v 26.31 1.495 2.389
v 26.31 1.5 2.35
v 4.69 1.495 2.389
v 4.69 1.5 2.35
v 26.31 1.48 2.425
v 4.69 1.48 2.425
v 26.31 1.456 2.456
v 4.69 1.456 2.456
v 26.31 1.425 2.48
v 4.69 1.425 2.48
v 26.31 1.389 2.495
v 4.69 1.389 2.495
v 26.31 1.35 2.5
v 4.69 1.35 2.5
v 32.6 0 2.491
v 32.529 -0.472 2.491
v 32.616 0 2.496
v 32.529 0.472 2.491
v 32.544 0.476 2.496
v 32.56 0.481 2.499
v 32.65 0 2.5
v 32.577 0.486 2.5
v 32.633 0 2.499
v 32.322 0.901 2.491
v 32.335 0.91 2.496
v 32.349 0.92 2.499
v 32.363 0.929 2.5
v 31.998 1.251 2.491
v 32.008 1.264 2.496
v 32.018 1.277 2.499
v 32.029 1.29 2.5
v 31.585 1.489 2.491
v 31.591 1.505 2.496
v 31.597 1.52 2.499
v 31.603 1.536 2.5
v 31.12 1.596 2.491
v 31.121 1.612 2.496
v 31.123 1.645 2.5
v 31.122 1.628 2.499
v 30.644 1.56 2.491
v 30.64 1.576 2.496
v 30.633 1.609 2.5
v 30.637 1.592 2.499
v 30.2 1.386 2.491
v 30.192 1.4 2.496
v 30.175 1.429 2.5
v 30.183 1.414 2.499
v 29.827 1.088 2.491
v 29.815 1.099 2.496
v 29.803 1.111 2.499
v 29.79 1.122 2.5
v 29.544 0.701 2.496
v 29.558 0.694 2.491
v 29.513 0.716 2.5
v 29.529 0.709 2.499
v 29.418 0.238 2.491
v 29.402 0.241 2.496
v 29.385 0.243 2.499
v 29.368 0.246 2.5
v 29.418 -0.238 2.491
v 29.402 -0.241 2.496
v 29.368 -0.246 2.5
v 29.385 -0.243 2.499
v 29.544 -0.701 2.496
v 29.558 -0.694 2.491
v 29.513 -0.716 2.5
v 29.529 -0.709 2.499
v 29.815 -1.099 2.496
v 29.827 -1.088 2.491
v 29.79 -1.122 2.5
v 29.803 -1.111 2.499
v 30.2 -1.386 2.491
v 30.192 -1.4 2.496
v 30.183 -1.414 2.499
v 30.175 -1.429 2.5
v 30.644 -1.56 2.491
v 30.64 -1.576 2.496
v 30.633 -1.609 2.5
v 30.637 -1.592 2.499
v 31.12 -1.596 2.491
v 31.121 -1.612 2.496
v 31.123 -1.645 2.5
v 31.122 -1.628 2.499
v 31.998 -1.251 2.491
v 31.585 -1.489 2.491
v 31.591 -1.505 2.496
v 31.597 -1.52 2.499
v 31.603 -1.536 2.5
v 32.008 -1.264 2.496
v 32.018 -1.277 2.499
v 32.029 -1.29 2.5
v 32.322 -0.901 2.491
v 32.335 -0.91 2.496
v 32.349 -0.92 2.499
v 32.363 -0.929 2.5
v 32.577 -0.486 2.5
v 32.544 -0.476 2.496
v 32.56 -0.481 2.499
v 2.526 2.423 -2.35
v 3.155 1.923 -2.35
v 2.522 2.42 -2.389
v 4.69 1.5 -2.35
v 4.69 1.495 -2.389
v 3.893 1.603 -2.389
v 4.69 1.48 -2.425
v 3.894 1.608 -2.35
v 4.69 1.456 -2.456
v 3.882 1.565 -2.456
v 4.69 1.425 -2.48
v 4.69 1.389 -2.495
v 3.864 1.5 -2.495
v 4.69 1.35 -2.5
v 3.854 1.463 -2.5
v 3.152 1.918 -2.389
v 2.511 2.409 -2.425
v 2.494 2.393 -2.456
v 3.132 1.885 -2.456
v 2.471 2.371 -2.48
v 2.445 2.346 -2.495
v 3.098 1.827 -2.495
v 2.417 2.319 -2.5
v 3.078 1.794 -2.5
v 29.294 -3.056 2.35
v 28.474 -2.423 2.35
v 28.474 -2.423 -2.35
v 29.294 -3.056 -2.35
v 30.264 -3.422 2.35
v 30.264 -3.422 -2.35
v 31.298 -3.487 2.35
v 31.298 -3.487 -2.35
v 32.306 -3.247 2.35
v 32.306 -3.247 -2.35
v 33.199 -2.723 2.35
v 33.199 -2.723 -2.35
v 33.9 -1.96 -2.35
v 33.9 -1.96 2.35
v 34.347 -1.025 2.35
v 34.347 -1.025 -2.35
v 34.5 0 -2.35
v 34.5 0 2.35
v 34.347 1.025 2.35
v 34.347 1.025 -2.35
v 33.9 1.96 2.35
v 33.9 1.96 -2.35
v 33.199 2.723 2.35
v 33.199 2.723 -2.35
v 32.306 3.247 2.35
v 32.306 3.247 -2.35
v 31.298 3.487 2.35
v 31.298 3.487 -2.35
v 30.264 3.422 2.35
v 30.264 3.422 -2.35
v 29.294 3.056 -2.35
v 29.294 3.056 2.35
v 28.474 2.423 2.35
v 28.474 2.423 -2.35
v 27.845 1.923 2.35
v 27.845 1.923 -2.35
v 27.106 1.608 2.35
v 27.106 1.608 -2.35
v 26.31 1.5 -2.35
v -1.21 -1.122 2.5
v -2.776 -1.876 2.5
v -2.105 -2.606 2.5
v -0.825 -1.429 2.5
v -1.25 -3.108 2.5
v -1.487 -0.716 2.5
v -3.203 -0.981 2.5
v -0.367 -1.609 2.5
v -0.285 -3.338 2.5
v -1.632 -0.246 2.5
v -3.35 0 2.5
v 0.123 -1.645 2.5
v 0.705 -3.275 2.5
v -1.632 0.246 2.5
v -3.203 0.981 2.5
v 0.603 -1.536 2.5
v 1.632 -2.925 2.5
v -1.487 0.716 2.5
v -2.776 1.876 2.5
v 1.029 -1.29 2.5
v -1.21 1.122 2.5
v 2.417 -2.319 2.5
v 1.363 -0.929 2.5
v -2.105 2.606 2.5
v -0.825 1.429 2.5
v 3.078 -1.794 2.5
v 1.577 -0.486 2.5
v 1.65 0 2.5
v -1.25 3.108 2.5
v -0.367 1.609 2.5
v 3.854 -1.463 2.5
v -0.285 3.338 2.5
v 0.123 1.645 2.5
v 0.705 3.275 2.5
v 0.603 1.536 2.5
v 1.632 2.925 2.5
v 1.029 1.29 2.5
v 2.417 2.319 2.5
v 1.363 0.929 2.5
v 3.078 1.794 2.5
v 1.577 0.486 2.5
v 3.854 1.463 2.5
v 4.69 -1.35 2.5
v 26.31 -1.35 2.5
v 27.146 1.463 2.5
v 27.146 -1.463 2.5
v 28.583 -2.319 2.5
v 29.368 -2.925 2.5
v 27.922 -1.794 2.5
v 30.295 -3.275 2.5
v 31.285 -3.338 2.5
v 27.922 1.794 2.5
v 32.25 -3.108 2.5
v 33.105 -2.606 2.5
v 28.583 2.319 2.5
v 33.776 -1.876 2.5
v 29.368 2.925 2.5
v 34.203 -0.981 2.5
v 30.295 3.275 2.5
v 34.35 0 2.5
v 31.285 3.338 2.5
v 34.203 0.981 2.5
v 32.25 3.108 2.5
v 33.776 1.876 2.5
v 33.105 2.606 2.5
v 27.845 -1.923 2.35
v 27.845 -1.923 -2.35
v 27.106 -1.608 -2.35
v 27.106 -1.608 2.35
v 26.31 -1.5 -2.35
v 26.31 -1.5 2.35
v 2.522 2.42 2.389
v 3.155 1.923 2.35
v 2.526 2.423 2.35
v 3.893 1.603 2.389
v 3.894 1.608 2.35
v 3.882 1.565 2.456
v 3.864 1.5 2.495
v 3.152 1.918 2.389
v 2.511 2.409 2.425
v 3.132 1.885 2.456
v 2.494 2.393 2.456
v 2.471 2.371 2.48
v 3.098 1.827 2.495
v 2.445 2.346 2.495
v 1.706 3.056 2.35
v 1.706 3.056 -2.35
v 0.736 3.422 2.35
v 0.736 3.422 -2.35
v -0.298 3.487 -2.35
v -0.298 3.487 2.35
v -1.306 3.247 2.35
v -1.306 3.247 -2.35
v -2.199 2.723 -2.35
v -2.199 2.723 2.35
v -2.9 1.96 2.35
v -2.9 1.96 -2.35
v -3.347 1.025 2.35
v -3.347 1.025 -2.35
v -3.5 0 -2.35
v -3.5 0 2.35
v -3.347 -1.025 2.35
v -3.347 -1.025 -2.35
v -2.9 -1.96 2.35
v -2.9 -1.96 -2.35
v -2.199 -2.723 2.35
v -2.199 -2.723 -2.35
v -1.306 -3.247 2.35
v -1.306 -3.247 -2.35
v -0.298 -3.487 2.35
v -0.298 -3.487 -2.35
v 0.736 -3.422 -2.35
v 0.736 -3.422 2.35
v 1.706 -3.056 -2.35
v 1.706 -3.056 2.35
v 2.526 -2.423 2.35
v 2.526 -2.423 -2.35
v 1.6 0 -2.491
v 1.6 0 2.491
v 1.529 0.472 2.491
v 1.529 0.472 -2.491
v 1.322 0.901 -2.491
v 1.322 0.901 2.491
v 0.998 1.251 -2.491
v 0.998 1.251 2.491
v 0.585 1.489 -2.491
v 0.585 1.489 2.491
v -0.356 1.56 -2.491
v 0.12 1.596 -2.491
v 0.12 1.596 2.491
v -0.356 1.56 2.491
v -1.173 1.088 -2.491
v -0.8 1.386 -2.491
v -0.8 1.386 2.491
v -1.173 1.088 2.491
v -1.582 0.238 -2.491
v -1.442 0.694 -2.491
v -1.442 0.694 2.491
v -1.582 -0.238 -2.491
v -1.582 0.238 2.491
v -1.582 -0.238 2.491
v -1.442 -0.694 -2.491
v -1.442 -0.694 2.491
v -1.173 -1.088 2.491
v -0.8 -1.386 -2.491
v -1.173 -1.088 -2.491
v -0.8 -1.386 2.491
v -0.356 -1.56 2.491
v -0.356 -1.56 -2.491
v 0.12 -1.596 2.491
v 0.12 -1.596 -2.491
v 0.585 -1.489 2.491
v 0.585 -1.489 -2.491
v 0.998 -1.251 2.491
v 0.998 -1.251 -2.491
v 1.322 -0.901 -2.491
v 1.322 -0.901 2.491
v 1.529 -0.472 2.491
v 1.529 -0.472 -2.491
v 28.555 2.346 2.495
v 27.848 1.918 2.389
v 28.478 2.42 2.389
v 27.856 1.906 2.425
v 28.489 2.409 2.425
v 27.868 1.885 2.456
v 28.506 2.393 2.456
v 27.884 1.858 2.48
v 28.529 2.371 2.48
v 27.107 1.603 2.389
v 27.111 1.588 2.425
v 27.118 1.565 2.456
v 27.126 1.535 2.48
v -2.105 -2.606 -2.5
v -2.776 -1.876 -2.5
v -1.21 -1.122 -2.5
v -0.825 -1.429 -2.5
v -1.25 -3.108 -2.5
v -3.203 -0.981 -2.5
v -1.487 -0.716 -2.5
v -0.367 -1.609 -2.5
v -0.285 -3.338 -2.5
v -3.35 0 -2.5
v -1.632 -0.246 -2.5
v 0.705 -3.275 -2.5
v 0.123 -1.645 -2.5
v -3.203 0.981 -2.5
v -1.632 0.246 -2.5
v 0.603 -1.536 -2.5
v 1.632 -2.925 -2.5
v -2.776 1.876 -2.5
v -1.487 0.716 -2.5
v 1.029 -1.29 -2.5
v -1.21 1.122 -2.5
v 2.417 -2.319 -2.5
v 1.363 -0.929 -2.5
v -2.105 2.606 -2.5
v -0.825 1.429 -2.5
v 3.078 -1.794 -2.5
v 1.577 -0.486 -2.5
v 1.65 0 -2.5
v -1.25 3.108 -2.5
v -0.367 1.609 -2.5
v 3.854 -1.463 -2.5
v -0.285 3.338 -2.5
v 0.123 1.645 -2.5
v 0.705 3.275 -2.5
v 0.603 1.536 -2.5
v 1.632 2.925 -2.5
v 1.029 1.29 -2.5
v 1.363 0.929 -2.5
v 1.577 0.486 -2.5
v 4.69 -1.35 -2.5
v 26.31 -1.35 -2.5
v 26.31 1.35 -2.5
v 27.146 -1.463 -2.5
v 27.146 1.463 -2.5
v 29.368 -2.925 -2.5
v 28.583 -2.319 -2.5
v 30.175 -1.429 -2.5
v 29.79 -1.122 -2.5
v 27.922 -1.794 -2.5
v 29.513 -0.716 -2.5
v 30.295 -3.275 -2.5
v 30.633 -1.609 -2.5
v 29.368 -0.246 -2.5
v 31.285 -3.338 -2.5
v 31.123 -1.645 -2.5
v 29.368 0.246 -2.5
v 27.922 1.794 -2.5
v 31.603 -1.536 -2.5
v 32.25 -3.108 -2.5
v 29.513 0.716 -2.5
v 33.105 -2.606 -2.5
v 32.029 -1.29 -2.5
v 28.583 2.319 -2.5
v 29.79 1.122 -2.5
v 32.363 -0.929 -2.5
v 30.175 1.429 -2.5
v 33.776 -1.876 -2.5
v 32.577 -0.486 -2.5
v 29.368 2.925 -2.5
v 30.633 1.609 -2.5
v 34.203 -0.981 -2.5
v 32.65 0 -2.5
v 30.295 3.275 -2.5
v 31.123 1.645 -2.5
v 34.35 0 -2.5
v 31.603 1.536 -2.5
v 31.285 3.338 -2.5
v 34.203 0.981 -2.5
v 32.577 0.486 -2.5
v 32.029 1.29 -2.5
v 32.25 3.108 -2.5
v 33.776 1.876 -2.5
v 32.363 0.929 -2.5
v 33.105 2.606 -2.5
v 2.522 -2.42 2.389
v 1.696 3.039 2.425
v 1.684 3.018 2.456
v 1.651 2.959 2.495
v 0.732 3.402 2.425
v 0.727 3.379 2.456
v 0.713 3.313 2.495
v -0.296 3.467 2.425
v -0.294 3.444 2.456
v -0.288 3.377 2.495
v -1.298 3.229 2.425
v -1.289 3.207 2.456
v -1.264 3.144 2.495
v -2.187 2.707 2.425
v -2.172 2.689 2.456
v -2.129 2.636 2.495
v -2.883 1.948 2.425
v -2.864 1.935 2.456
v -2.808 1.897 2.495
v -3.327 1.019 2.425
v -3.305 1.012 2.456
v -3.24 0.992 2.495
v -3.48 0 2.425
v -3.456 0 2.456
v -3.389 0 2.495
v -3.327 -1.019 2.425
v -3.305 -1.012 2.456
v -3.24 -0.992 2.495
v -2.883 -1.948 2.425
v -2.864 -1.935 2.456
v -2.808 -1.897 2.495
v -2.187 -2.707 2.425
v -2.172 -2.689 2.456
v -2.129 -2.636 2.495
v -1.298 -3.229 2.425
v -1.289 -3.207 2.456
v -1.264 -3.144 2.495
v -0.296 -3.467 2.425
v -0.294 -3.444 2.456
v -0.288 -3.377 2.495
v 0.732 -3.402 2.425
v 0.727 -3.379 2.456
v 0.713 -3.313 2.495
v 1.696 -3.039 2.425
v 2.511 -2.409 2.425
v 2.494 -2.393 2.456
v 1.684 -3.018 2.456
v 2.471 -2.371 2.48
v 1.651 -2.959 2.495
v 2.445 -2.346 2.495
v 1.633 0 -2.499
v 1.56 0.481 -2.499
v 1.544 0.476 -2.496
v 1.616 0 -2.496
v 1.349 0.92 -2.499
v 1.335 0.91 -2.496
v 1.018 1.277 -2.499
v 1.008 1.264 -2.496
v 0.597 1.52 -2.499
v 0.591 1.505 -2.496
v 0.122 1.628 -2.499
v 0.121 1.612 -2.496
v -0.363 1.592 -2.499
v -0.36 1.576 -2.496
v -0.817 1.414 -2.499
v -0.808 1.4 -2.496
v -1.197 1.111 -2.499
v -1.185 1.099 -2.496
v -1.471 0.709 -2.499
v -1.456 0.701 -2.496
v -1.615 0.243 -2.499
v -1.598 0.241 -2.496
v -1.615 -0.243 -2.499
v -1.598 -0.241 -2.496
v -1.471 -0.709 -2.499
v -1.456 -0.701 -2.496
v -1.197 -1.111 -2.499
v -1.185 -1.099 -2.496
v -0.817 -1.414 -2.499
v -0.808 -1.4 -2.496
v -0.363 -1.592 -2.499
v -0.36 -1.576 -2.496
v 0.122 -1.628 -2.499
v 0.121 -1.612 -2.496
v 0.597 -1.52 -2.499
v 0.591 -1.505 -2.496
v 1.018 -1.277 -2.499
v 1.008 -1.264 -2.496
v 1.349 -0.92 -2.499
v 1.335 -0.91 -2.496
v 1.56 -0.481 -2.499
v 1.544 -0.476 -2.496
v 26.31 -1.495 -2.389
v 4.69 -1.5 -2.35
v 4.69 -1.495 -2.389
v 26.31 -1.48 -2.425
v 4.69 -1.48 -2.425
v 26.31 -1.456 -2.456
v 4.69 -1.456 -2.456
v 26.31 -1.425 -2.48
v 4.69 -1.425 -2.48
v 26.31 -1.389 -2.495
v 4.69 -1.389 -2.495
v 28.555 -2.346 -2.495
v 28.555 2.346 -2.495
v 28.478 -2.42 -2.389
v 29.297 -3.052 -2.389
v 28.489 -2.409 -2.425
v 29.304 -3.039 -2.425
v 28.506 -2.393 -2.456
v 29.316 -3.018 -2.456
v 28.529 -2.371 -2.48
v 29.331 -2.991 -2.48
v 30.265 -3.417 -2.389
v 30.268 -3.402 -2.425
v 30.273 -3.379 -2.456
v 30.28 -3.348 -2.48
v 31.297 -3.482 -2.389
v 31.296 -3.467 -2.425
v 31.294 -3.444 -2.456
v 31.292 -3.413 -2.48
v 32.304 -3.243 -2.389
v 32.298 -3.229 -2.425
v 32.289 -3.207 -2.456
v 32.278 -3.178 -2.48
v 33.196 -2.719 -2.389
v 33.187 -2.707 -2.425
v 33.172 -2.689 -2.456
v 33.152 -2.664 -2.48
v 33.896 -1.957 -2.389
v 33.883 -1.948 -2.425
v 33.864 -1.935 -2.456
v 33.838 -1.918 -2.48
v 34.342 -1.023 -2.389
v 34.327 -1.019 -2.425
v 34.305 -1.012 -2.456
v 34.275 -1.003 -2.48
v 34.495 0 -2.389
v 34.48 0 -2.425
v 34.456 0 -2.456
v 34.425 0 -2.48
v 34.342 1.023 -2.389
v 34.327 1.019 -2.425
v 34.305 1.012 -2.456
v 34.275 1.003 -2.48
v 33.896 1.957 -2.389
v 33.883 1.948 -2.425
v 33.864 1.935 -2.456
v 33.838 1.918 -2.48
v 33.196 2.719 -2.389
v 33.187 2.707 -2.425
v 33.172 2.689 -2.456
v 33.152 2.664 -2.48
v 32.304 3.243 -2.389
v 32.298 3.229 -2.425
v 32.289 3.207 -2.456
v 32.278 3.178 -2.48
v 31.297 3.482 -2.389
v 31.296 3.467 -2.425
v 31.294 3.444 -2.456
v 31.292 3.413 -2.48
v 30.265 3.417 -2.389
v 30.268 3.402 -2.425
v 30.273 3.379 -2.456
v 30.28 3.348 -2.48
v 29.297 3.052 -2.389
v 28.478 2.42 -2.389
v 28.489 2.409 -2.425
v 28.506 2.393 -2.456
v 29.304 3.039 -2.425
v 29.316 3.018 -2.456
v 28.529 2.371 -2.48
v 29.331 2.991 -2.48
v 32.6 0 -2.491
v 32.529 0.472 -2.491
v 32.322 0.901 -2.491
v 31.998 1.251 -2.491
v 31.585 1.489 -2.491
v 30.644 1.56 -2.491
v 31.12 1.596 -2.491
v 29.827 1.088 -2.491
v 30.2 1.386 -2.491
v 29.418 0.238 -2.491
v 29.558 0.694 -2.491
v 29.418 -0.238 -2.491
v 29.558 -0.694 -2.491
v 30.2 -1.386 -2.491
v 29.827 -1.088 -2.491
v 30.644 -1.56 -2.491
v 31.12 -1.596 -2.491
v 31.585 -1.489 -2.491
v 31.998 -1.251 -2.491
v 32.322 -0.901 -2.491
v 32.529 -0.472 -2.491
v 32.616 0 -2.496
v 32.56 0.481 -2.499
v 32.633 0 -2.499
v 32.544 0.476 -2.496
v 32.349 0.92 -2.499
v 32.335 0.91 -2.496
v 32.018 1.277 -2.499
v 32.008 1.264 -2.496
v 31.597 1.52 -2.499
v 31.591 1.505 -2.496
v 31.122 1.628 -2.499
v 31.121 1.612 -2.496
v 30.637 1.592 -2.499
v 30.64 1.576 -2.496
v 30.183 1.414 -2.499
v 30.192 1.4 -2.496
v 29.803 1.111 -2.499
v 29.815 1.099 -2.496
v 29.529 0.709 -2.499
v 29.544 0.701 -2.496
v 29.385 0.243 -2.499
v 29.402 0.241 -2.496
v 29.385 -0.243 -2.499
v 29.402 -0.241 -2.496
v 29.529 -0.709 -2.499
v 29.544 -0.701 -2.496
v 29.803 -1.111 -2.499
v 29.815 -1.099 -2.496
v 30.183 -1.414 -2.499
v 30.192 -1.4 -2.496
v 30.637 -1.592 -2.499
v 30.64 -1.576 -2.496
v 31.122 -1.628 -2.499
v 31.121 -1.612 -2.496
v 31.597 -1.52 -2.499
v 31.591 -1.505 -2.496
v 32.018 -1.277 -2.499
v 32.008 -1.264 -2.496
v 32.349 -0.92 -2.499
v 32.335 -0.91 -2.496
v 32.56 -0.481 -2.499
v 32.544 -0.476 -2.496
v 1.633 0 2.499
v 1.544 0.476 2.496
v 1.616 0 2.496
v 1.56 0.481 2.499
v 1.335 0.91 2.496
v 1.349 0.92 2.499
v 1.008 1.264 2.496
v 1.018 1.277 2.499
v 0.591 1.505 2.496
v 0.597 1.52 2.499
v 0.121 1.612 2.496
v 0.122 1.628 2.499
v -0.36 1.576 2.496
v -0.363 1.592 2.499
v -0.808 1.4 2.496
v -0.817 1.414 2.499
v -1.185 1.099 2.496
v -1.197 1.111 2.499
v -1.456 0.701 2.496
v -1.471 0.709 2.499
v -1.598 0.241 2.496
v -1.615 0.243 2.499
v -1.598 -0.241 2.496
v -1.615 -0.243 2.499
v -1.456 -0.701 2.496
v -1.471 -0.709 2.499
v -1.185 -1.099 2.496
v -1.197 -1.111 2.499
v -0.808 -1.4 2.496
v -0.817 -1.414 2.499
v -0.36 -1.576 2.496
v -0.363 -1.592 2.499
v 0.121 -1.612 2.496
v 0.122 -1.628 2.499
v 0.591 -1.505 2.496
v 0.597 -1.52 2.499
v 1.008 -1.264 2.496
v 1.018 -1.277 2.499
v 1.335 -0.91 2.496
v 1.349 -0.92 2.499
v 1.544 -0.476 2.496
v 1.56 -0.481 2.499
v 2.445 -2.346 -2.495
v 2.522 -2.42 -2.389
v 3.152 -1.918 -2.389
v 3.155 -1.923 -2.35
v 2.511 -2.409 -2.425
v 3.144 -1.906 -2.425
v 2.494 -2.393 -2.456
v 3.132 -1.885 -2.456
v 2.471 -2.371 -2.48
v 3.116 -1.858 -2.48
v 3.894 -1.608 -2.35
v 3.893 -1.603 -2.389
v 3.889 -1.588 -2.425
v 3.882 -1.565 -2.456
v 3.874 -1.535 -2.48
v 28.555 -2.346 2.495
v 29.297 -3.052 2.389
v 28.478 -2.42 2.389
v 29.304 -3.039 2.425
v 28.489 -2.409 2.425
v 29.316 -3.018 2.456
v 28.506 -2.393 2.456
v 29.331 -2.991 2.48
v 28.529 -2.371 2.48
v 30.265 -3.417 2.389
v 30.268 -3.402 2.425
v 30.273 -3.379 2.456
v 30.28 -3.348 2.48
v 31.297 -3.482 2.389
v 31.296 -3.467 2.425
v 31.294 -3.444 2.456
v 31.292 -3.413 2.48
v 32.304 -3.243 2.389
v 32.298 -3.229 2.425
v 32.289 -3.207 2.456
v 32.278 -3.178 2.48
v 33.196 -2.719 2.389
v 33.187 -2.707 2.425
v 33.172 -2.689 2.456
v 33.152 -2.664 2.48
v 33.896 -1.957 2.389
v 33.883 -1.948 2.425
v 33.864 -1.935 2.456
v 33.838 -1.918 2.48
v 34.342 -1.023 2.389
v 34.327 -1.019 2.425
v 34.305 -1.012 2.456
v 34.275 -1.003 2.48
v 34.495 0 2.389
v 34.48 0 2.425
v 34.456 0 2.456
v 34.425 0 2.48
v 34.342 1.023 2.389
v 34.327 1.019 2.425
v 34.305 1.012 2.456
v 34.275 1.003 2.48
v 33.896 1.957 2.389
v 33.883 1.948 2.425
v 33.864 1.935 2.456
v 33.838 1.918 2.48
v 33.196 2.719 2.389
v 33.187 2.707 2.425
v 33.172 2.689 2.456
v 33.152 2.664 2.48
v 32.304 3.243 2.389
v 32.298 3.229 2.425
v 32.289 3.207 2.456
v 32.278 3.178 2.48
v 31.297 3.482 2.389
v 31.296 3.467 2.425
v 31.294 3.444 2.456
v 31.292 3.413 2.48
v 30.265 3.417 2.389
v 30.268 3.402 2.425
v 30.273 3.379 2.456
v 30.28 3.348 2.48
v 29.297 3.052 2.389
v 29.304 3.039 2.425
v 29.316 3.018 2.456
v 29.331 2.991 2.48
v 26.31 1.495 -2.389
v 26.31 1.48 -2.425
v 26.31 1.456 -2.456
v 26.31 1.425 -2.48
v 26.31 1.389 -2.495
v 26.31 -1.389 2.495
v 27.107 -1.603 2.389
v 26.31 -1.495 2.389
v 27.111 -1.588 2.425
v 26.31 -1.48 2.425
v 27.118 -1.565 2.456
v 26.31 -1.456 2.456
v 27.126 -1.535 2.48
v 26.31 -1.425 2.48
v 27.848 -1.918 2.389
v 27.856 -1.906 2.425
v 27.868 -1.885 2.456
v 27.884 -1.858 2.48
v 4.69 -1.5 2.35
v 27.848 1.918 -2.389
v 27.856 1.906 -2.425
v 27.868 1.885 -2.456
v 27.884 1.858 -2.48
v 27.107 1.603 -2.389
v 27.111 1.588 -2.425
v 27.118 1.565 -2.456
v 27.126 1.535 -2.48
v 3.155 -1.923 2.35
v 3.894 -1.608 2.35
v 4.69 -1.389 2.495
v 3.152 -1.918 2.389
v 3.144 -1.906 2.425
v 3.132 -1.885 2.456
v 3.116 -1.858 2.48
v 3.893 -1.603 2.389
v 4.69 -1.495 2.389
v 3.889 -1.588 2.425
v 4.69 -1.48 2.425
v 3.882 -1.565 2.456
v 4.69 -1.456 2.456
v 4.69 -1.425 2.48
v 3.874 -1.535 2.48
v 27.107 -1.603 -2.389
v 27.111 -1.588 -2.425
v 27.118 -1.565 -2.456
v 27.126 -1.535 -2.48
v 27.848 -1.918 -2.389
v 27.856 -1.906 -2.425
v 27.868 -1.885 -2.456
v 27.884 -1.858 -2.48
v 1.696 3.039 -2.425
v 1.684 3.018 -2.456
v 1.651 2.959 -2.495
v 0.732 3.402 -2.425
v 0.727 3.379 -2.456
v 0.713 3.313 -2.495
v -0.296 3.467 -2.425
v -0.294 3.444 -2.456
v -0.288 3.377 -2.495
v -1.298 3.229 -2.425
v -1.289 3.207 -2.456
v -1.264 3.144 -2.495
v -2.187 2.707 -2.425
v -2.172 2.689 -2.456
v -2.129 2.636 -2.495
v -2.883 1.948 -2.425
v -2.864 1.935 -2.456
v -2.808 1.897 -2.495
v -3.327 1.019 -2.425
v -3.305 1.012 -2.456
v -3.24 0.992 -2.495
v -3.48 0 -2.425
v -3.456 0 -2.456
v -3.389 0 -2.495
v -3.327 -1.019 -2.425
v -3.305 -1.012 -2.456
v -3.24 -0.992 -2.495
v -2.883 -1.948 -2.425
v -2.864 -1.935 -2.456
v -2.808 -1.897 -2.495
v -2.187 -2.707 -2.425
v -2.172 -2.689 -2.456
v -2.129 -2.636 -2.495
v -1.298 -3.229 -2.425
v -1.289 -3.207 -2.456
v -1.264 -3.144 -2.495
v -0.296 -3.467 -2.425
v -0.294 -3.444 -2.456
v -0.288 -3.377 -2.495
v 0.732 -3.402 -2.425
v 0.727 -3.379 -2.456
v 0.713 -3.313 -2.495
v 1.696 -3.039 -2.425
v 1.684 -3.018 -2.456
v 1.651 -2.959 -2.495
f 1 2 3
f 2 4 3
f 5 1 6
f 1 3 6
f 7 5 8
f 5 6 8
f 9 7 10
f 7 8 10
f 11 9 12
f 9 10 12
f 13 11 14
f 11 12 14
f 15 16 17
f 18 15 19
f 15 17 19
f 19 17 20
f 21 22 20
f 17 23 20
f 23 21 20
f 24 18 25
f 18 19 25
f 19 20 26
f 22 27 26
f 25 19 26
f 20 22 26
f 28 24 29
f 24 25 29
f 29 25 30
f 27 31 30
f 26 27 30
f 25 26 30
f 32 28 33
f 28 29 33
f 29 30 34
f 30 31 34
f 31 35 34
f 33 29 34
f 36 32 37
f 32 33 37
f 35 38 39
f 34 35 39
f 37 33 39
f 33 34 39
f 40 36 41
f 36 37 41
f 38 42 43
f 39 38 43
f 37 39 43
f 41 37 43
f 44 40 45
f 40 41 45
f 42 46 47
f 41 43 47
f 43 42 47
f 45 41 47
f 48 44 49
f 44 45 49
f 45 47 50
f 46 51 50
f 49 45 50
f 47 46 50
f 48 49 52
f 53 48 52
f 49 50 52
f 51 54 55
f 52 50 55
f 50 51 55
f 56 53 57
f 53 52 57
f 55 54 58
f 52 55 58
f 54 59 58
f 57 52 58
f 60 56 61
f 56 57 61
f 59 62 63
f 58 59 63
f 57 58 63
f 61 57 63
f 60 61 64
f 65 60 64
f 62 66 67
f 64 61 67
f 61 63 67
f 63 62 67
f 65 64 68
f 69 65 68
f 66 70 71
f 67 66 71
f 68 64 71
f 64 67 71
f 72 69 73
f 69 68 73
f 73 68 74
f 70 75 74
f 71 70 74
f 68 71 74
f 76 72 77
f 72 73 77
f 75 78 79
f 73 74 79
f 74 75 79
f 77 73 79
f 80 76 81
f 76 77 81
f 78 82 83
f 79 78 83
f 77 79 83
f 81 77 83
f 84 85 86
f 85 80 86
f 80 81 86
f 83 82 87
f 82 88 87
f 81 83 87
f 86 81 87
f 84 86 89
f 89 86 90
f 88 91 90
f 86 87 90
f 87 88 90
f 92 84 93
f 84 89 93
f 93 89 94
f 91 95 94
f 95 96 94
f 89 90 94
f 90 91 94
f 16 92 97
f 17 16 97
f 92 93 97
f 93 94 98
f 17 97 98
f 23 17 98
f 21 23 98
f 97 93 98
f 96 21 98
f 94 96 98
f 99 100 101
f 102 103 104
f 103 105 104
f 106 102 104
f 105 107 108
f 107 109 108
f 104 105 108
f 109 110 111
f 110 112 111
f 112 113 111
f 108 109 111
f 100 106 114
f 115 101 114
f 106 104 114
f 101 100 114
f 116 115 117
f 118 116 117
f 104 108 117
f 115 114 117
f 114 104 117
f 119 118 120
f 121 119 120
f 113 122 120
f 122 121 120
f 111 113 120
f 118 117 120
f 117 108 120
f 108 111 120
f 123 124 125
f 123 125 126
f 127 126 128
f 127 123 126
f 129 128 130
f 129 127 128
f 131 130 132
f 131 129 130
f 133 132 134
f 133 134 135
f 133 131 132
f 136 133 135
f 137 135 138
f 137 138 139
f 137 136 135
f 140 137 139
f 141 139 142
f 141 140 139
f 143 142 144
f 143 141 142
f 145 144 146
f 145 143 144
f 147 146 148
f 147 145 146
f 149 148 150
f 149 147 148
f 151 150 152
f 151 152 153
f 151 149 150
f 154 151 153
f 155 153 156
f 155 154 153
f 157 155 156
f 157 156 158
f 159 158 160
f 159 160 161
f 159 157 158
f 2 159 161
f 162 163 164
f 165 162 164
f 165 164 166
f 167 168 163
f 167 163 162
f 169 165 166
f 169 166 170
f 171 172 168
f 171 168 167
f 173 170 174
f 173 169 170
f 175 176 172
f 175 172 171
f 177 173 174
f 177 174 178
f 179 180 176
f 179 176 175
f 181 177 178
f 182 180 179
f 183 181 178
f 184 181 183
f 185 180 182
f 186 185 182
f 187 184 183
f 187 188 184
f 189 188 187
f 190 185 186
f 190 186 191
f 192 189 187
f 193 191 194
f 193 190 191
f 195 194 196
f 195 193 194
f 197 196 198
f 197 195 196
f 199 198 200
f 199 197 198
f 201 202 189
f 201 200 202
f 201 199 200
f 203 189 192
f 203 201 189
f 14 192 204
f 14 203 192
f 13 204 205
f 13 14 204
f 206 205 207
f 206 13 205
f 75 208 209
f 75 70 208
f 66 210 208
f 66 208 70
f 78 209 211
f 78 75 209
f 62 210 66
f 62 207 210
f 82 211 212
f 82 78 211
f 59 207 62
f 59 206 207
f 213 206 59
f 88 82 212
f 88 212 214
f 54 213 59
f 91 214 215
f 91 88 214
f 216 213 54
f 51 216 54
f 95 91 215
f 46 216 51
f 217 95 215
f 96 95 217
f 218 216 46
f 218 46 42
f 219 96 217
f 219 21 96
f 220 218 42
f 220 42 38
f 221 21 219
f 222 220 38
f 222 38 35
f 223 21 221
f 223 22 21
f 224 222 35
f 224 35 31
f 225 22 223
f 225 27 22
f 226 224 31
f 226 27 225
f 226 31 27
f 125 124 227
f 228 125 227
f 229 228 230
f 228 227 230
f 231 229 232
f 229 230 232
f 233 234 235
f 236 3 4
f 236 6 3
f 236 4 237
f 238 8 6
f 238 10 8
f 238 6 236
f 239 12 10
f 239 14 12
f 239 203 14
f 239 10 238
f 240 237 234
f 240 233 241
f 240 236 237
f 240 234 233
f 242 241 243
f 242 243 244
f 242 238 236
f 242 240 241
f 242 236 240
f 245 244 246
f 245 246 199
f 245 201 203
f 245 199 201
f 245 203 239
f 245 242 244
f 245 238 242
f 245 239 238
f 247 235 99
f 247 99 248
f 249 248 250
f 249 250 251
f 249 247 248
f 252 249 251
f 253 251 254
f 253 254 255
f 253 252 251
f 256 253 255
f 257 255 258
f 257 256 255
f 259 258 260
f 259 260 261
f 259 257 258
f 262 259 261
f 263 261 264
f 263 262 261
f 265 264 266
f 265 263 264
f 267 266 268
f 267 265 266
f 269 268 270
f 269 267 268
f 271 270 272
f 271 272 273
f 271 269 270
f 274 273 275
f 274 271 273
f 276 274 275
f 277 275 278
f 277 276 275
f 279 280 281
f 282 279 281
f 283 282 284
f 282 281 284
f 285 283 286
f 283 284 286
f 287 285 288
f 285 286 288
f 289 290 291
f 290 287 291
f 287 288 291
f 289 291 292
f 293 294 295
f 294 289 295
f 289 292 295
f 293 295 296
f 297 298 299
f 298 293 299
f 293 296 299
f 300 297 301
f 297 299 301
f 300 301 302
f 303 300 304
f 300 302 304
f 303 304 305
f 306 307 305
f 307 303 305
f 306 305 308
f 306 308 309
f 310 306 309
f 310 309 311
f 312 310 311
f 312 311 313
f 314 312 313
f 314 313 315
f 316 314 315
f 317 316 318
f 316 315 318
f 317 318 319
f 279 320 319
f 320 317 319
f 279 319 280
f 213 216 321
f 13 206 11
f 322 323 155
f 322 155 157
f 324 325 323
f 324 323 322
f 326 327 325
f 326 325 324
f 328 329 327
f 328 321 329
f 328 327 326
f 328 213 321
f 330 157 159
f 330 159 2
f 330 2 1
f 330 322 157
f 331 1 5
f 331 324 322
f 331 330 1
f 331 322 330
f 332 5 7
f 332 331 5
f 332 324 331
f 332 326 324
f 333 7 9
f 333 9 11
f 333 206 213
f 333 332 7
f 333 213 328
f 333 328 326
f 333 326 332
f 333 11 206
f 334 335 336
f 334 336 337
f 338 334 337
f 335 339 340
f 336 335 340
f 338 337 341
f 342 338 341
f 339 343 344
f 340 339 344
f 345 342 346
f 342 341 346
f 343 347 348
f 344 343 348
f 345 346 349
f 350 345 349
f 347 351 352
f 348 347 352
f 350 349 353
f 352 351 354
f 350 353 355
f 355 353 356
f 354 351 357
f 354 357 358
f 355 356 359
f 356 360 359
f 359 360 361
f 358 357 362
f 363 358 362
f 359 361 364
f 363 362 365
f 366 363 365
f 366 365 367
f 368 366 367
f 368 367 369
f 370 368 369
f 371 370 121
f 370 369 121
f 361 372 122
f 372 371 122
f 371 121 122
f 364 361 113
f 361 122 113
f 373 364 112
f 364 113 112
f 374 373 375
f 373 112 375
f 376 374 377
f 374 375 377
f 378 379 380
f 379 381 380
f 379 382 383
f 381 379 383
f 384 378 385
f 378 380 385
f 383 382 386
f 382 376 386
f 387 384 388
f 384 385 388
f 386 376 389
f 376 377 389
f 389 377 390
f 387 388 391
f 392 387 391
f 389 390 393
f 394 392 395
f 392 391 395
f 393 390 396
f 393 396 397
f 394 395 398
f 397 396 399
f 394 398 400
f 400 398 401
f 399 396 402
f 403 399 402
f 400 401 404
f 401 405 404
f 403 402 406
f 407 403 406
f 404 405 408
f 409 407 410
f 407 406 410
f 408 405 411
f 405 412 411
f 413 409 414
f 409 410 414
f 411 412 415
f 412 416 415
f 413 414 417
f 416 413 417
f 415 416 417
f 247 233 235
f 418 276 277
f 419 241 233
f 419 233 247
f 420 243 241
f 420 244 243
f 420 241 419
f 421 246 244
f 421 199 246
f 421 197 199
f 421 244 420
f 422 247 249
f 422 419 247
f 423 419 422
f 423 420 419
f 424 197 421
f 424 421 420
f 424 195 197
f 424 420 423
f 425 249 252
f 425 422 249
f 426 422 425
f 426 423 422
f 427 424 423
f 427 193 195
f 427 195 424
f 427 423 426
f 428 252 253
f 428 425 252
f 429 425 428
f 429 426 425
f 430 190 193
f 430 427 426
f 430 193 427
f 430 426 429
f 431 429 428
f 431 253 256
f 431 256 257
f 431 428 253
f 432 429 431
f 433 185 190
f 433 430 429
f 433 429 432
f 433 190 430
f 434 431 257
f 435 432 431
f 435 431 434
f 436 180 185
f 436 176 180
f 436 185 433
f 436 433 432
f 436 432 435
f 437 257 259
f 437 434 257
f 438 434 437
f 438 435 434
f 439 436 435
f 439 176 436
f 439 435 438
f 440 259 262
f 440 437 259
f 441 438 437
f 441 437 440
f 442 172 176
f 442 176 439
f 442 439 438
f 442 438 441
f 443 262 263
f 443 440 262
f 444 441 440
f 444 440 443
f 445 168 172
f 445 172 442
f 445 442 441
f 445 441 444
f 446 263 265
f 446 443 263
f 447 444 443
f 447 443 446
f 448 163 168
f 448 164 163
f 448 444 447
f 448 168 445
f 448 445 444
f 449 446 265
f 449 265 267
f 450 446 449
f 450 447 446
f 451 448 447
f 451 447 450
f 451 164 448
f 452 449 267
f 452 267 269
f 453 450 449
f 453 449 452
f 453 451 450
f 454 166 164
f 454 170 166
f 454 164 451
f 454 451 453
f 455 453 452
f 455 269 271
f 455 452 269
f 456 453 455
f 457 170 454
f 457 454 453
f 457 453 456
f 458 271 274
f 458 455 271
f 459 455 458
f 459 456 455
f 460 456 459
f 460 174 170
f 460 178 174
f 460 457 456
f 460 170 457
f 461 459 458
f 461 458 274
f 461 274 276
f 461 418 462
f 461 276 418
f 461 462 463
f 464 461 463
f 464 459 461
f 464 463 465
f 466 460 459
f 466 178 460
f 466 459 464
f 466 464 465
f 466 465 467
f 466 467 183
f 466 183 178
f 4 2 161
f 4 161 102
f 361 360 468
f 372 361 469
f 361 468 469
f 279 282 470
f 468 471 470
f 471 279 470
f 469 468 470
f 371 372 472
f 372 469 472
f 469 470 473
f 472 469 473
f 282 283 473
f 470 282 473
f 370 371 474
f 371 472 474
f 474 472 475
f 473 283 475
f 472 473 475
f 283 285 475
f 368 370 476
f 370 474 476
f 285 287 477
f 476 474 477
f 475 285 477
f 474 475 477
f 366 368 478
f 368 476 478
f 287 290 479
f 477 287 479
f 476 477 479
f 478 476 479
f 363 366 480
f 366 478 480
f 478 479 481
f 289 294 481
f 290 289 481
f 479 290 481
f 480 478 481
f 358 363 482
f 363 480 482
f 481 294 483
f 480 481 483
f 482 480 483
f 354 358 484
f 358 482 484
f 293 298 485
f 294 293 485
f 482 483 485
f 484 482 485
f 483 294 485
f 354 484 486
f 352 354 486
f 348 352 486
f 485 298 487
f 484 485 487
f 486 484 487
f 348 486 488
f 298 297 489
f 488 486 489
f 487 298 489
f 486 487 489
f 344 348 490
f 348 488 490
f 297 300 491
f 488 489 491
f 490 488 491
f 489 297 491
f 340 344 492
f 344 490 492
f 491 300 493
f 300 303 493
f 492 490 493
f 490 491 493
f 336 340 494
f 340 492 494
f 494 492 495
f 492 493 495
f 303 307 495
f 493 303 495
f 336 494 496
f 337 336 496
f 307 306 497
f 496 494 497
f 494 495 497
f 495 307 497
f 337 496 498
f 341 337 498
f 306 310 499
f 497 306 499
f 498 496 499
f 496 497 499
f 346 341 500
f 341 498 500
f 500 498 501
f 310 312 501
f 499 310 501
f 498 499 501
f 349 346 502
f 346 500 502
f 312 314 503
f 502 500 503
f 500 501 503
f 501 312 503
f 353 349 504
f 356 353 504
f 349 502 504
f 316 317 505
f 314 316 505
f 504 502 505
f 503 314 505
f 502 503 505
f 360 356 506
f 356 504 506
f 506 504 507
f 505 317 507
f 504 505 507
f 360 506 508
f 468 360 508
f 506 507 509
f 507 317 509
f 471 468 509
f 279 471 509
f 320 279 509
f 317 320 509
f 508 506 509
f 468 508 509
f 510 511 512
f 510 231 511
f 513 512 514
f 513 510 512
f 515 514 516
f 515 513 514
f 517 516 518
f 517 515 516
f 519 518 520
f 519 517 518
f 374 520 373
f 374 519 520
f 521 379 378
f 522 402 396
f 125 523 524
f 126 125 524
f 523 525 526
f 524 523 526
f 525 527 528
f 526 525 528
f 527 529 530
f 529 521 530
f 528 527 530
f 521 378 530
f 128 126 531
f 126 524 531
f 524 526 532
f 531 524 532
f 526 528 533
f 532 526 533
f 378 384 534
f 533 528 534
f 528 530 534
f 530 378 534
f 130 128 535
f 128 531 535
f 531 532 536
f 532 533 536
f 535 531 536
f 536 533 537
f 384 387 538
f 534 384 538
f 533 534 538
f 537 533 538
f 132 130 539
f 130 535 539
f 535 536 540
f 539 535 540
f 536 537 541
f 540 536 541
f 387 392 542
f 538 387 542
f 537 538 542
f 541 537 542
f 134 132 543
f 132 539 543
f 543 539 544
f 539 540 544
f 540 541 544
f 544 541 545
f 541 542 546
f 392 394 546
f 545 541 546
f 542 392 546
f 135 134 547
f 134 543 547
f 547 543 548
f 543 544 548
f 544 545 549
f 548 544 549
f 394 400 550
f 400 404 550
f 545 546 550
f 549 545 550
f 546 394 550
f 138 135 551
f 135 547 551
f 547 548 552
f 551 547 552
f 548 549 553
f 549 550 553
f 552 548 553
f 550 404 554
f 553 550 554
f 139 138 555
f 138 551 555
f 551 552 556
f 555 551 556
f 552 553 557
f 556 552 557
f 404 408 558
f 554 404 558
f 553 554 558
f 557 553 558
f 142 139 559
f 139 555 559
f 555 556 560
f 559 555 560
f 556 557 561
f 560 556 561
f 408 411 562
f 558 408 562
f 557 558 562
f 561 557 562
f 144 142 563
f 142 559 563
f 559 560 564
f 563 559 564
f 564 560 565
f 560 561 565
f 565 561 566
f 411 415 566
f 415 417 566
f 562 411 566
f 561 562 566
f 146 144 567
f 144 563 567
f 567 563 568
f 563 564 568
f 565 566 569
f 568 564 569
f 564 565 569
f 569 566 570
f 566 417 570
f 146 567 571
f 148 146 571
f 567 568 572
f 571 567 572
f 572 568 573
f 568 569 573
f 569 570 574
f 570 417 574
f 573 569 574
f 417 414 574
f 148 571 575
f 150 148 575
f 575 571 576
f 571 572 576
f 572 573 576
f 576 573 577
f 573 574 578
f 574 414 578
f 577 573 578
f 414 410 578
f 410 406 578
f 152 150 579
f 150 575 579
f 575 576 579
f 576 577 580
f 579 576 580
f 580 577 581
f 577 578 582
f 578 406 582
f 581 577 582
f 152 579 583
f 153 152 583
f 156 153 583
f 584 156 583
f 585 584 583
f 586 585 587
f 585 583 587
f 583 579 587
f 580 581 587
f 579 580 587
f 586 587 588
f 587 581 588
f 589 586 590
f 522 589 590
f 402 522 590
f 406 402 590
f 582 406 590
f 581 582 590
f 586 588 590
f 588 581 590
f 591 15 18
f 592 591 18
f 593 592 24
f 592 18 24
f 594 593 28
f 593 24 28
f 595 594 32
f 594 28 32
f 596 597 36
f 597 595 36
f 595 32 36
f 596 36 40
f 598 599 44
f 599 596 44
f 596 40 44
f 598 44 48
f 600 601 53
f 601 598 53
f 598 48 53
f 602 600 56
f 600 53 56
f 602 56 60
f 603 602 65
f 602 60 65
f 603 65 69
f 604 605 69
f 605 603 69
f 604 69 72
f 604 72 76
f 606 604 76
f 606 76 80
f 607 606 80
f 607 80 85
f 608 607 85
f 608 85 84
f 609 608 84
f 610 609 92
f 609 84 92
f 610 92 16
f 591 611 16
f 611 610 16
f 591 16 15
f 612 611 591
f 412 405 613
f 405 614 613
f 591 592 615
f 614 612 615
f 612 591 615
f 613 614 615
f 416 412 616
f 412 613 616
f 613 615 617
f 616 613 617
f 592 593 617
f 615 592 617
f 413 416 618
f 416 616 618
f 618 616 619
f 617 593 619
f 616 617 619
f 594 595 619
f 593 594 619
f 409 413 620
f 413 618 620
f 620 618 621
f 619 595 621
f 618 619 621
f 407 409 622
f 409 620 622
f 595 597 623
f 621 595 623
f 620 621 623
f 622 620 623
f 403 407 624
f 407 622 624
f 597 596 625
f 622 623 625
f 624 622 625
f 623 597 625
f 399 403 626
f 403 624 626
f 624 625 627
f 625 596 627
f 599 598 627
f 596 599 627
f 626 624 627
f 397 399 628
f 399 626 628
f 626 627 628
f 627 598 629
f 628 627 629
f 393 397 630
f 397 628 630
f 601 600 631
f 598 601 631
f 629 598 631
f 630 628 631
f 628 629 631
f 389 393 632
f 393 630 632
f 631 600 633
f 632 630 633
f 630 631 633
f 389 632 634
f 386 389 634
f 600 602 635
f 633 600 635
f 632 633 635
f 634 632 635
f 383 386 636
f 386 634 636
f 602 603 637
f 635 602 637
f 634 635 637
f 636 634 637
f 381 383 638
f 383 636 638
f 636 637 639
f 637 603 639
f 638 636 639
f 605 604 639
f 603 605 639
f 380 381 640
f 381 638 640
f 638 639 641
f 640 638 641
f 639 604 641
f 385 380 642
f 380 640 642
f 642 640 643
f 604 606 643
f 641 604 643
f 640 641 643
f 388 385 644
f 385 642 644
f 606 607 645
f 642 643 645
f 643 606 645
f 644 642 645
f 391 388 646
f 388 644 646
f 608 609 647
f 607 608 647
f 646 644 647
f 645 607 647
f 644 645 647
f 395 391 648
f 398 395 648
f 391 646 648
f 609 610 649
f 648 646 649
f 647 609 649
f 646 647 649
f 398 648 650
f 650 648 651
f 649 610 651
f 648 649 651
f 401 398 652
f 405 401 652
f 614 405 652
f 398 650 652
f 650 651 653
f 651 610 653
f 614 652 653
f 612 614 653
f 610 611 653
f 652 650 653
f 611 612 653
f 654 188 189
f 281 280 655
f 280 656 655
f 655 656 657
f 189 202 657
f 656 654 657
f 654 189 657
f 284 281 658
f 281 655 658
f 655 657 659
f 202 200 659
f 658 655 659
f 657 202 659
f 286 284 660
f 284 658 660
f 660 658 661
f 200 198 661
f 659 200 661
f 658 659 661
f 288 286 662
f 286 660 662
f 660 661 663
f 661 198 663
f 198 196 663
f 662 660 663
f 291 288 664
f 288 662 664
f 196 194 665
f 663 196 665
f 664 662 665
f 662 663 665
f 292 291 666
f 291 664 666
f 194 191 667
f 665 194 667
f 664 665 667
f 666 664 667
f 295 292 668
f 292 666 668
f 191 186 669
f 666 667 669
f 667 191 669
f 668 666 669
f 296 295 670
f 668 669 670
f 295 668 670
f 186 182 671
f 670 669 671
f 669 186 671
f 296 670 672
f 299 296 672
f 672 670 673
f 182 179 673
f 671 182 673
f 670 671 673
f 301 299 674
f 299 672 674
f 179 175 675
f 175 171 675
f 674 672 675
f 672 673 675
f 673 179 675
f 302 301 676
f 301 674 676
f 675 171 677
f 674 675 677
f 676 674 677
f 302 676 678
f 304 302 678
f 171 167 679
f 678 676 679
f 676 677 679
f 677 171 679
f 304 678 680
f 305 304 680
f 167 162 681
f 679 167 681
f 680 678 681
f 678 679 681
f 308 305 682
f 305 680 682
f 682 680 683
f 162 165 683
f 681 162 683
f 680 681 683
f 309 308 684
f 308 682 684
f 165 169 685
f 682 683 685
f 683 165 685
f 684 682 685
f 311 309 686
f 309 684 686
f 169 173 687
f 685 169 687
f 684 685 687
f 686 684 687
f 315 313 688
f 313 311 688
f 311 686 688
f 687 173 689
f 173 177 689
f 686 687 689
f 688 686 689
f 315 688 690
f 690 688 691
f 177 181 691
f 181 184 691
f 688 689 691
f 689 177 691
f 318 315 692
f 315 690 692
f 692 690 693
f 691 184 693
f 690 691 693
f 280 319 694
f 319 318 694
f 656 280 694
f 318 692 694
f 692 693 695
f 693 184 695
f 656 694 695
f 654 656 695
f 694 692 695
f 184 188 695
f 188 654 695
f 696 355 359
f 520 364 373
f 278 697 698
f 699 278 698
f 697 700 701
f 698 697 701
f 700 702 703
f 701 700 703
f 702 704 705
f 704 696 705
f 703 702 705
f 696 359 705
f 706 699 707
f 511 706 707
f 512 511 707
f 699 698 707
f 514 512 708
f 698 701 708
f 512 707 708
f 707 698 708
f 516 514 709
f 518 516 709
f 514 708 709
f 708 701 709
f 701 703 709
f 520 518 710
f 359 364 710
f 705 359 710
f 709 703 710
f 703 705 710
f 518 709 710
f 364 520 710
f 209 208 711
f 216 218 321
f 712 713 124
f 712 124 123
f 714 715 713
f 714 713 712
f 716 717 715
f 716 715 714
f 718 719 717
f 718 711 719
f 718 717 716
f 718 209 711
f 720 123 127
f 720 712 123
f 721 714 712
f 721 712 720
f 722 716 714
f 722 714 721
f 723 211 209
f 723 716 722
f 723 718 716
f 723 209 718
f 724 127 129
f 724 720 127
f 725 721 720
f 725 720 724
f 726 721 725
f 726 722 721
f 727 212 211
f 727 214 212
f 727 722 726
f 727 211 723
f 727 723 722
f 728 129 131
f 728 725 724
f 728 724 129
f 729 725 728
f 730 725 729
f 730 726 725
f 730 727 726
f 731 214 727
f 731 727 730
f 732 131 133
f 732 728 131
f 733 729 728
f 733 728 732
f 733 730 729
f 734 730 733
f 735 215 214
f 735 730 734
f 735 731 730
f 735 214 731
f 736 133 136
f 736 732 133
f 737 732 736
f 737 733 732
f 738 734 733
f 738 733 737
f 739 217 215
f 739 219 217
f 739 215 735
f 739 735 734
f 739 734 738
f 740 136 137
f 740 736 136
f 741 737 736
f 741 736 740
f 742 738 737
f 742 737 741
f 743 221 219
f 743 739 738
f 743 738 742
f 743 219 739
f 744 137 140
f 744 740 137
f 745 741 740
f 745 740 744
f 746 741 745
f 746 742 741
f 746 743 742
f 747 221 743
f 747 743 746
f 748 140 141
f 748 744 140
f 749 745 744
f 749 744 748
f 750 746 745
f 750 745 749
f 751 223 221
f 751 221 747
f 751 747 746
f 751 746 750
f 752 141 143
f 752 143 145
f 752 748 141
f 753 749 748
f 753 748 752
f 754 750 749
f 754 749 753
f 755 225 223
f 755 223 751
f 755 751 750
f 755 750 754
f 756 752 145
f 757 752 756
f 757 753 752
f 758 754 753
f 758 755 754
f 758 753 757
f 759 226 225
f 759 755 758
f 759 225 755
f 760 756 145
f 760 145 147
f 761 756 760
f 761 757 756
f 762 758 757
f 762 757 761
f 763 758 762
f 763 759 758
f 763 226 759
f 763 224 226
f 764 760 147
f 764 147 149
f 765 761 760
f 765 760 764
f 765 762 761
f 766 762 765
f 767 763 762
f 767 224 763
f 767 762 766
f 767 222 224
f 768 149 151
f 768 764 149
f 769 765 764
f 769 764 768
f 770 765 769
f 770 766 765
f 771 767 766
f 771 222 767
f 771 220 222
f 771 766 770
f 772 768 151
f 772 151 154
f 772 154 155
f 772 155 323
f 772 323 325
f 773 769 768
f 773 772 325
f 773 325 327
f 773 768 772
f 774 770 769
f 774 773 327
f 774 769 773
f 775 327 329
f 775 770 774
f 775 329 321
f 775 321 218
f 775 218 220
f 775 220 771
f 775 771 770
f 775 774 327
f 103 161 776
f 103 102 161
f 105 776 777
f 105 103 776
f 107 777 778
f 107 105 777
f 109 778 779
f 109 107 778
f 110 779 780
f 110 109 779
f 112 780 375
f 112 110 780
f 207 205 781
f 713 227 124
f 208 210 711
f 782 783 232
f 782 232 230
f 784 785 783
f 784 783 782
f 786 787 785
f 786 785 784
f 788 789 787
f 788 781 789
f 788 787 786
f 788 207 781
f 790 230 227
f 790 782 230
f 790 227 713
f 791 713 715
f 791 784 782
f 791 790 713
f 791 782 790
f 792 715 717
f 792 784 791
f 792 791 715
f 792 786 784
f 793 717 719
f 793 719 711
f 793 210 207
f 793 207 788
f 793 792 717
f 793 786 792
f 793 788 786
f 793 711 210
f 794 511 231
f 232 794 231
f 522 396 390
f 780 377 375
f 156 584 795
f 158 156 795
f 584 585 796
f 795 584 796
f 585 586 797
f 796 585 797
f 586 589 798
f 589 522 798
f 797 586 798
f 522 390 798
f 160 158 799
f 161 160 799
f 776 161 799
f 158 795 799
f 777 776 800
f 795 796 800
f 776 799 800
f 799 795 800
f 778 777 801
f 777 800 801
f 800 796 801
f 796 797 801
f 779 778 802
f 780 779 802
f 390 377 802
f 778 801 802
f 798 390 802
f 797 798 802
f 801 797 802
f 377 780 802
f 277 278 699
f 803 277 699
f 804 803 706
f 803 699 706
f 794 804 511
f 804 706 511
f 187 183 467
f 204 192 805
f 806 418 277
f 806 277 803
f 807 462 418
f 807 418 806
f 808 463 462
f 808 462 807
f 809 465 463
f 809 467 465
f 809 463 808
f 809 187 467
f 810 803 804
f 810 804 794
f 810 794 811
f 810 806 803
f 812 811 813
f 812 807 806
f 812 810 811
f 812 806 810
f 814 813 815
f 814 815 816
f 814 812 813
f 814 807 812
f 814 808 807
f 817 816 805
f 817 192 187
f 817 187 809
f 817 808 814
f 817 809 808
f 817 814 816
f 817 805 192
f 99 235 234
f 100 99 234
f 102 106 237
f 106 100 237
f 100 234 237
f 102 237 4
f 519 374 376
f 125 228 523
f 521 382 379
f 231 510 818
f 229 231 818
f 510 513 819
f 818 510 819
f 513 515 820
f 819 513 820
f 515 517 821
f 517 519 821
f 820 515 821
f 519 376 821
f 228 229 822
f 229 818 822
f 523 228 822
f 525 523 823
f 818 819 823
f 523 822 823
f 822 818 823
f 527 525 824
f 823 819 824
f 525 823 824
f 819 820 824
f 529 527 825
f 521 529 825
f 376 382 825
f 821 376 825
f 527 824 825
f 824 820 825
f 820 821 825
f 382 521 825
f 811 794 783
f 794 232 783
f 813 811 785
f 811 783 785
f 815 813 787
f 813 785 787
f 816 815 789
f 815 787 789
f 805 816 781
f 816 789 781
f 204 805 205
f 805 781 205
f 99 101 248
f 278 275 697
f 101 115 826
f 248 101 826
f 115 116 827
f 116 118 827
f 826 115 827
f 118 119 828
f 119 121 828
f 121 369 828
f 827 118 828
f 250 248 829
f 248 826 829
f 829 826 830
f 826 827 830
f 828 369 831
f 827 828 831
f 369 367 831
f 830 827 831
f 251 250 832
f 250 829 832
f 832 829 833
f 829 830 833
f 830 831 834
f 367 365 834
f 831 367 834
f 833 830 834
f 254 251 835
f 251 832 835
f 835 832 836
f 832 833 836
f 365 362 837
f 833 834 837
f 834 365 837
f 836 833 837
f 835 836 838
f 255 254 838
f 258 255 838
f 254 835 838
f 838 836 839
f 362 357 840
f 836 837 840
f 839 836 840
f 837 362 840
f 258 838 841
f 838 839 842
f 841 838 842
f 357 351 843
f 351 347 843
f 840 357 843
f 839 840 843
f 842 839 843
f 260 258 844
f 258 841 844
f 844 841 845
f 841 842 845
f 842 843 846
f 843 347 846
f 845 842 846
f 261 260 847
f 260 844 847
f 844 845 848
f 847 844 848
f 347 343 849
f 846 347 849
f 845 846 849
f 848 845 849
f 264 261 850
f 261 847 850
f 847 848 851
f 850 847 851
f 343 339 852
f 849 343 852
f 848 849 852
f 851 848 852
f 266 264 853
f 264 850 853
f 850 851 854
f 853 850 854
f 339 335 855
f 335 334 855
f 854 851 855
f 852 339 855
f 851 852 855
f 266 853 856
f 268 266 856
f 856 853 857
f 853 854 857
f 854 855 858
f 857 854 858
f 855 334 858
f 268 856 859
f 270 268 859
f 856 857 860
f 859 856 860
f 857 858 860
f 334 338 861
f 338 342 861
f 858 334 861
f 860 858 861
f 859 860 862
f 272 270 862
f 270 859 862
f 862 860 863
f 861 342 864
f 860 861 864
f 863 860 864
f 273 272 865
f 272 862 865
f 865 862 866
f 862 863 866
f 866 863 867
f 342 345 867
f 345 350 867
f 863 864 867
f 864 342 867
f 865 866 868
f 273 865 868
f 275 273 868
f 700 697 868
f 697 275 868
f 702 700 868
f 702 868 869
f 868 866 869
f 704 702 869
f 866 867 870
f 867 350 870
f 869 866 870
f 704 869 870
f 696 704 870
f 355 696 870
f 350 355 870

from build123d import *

# Parameters (mm, degrees)
SKETCH1_R            = 3.5
SKETCH1_R_2          = 1.5
BOSS_EXTRUDE1_DEPTH  = 2.5
FILLET1_R            = 3
FILLET2_R            = 0.15
M3_CLEARANCE_HOLE1_D = 3.2


with BuildPart() as part:
    # Sketch1 → Boss-Extrude1 (new, symmetric)
    # profile 1 of 3: a face of its own
    with BuildSketch(Plane.XY):
        Circle(SKETCH1_R)
        Circle(SKETCH1_R_2, mode=Mode.SUBTRACT)
    # profile 2 of 3: a face of its own
    with BuildSketch(Plane.XY):
        with BuildLine():
            Line((3.16227766, -1.5), (27.83772234, -1.5))
            ThreePointArc((27.83772234, -1.5), (27.5, 0), (27.83772234, 1.5))
            Line((27.83772234, 1.5), (3.16227766, 1.5))
            ThreePointArc((3.16227766, 1.5), (3.414525722, 0.768774411), (3.5, 0))
            ThreePointArc((3.5, 0), (3.414525722, -0.768774411), (3.16227766, -1.5))
        make_face()
    # profile 3 of 3: a face of its own
    with BuildSketch(Plane.XY):
        with Locations((31, 0)):
            Circle(SKETCH1_R)
        with Locations((31, 0)):
            Circle(SKETCH1_R_2, mode=Mode.SUBTRACT)
    extrude(amount=BOSS_EXTRUDE1_DEPTH, both=True)

    # Fillet1
    fillet1_edges = [part.edges().sort_by_distance(p)[0] for p in [
        (27.83772234, 1.5, 0),
        (27.83772234, -1.5, 0),
        (3.16227766, -1.5, 0),
        (3.16227766, 1.5, 0),
    ]]
    fillet(fillet1_edges, radius=FILLET1_R)

    # Fillet2
    fillet2_edges = [part.edges().sort_by_distance(p)[0] for p in [
        (-3.5, 0, -2.5),
        (-3.5, 0, 2.5),
        (-1.5, 0, 2.5),
        (15.5, 1.5, -2.5),
        (15.5, 1.5, 2.5),
        (34.5, 0, -2.5),
        (34.5, 0, 2.5),
        (29.5, 0, 2.5),
        (15.5, -1.5, -2.5),
        (15.5, -1.5, 2.5),
        (3.513718949, 1.740401367, -2.5),
        (3.513718949, 1.740401367, 2.5),
        (27.486281051, 1.740401367, -2.5),
        (27.486281051, 1.740401367, 2.5),
        (3.513718949, -1.740401367, -2.5),
        (3.513718949, -1.740401367, 2.5),
        (27.486281051, -1.740401367, -2.5),
        (27.486281051, -1.740401367, 2.5),
        (29.5, 0, -2.5),
        (-1.5, 0, -2.5),
    ]]
    fillet(fillet2_edges, radius=FILLET2_R)

    # M3 Clearance Hole1 (through all)
    with Locations(Plane(origin=(0, 0, -2.5), x_dir=(-1, 0, 0), z_dir=(0, 0, -1))):
        with Locations((-31, 0), (0, 0)):
            Hole(M3_CLEARANCE_HOLE1_D / 2)


solid = part.part
